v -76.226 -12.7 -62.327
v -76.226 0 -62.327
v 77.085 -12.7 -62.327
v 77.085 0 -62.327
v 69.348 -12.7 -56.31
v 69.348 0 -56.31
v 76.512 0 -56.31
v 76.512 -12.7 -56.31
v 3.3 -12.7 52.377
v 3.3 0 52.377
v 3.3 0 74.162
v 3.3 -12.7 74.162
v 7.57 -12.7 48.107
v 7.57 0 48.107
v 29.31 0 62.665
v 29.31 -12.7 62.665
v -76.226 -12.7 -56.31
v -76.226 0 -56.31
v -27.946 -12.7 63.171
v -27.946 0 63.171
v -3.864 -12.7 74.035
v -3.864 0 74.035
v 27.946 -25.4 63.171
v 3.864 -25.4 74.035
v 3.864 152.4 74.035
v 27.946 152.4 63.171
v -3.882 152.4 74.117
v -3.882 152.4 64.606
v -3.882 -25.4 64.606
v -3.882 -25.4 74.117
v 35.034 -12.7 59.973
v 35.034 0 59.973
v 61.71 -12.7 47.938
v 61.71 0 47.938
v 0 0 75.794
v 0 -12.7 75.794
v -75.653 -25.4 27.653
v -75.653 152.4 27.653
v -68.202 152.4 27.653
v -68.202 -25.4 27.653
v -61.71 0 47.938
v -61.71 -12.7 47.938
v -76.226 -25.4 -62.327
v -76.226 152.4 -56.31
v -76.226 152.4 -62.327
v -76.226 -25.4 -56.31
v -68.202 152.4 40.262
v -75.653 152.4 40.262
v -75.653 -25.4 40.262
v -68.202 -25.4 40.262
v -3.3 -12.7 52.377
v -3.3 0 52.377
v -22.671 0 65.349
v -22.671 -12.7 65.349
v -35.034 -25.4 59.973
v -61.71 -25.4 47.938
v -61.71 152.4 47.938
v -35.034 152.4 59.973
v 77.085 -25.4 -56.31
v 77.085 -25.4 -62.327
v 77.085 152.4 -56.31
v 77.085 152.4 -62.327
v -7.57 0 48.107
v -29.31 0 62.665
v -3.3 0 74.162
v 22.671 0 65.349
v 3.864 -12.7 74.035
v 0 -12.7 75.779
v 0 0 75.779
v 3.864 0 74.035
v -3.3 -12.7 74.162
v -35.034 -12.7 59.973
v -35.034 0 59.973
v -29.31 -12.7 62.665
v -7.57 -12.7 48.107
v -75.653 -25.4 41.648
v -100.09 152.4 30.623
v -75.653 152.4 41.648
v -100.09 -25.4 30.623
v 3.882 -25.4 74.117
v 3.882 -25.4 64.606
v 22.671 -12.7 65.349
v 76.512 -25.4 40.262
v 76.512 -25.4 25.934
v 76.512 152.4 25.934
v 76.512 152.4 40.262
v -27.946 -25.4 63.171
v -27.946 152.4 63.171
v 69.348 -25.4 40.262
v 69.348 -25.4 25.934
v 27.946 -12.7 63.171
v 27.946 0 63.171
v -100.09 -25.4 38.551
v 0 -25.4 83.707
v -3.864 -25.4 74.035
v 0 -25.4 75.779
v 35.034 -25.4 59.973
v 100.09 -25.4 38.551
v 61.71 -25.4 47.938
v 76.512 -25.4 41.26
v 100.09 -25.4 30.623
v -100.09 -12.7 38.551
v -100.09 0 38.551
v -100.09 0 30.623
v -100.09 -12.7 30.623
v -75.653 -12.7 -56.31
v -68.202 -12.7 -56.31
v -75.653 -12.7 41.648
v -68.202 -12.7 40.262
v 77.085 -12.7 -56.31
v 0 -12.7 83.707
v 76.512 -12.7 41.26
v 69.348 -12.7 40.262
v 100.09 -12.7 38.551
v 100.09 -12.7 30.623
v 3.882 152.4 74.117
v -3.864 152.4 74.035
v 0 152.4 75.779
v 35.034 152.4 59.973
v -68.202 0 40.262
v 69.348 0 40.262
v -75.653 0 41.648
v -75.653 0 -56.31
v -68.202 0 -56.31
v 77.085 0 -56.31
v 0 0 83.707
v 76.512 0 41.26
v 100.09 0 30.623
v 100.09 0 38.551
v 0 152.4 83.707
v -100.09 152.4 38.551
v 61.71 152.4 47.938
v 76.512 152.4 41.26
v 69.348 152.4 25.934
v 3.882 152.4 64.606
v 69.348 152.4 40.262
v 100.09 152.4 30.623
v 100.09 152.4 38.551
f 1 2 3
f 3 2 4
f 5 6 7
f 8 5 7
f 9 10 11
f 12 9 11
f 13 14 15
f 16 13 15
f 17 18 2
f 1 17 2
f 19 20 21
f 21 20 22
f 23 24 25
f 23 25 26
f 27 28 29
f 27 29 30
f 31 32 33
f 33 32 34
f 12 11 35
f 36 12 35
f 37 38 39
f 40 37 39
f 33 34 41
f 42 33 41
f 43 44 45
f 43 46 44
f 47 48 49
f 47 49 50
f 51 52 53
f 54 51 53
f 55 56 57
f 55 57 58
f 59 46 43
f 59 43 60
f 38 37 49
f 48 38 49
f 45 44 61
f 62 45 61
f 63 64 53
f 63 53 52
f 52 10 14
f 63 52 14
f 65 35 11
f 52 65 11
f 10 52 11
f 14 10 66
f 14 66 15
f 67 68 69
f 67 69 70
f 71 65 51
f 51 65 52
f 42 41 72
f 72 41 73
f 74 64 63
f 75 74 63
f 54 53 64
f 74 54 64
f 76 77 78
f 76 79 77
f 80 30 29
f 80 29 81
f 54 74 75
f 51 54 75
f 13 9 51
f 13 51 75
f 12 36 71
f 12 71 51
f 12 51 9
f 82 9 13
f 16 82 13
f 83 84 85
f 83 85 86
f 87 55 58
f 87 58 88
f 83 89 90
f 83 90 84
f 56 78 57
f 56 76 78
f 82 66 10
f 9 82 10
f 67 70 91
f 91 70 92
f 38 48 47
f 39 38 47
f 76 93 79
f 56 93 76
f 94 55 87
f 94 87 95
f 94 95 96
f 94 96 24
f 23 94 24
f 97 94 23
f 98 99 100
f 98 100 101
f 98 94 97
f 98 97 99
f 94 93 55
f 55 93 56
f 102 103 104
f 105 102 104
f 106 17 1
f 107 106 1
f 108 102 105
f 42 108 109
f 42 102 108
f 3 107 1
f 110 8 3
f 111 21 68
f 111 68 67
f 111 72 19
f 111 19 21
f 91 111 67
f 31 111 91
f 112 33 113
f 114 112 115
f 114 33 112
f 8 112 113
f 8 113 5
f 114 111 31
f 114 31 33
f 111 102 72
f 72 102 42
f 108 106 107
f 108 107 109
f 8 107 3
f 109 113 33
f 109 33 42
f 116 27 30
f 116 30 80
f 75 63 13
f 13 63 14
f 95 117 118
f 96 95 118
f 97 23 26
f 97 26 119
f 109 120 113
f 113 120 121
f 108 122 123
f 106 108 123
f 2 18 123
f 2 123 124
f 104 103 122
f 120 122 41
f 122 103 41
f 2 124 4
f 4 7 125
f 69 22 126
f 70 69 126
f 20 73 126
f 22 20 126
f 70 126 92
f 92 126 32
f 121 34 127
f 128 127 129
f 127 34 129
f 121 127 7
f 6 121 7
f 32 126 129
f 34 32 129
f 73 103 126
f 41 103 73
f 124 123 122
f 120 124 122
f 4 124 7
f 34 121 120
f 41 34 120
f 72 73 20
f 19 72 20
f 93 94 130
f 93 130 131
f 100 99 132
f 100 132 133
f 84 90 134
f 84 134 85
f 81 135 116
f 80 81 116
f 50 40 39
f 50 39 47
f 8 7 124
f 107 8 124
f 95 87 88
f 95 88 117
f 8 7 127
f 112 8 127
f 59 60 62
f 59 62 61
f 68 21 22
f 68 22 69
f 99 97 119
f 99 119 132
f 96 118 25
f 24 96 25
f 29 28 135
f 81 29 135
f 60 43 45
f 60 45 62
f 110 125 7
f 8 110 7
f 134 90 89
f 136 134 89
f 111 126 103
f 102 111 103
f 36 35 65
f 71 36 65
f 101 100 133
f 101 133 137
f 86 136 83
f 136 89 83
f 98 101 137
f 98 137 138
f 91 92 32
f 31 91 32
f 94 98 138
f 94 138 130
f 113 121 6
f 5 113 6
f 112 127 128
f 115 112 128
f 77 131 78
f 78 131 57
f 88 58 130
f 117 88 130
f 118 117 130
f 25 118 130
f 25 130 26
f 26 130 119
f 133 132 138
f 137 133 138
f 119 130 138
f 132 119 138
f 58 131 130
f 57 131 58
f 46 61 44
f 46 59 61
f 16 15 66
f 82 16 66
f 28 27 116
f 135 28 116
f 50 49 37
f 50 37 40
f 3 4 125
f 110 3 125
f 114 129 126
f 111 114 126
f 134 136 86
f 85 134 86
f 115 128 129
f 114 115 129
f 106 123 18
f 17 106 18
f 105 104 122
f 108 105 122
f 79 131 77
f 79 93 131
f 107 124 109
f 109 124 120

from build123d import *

# Parameters (mm, degrees)
F2_DEPTH      = 25.4
F2_DEPTH_BACK = 152.4
F0_W          = 7.4506402016
F0_H          = 12.6087740064
F0_W_2        = 7.1640759706
F0_H_2        = 14.3281519413
F1_W          = 7.7642686665
F1_H          = 9.5112249255
F0_H_3        = 83.9629881084
F3_DEPTH      = 12.7
F6_DEPTH      = 12.7
F4_W          = 5.8232028969
F4_H          = 12.3464902455
F10_DEPTH     = 12.7


# Not quite as in the source:
# - ends of sketch curves that miss each other by under 0.0002 mm in the source are joined


with BuildPart() as f2:
    # F0 (on Front) → F2 (new body, two sides)
    with BuildSketch(Plane.XZ) as f2_sk:
        Polygon((-75.6526514888, 47.9380041004), (-75.6526514888, 41.6479729853), (-61.7104200599, 47.9380041004), align=None)
        Polygon((61.7104200599, 47.9380041004), (76.5123516321, 41.2601196722), (76.5123516321, 47.9380041004), align=None)
        Polygon((-100.0904308233, 30.6228803963), (-75.6526514888, 41.6479729853), (-75.6526514888, 47.9380041004), (-61.7104200599, 47.9380041004), (-35.0340465252, 59.973037404), (-27.9464338127, 63.1706105272), (-3.864014828, 74.0353824624), (0, 75.7786309245), (0, 83.7069652426), (-100.0904308233, 38.5512147144), align=None)
        Polygon((76.5123516321, 47.9380041004), (76.5123516321, 41.2601196722), (100.0904308233, 30.6228803963), (100.0904308233, 38.5512147144), (0, 83.7069652426), (0, 75.7786309245), (3.864014828, 74.0353824624), (27.9464338127, 63.1706105272), (35.0340465252, 59.973037404), (61.7104200599, 47.9380041004), align=None)
    extrude(amount=F2_DEPTH)
    extrude(f2_sk.sketch, amount=-F2_DEPTH_BACK)


with BuildPart() as f2b:
    # F0 (on Front) → F2, piece 2 (new body, two sides)
    with BuildSketch(Plane.XZ) as f2_2_sk:
        Polygon((-75.6526514888, -56.3096441329), (-76.2257799506, -56.3096441329), (-76.2257799506, -62.3274669051), (77.085480094, -62.3274669051), (77.085480094, -56.3096441329), (76.5123516321, -56.3096441329), (69.3482756615, -56.3096441329), (-68.2020112872, -56.3096441329), align=None)
    extrude(amount=F2_DEPTH)
    extrude(f2_2_sk.sketch, amount=-F2_DEPTH_BACK)


with BuildPart() as f2c:
    # F0 (on Front) → F2, piece 3 (new body, two sides)
    with BuildSketch(Plane.XZ) as f2_3_sk:
        with Locations((-71.927331388, 33.9577309787)):
            Rectangle(F0_W, F0_H)
    extrude(amount=F2_DEPTH)
    extrude(f2_3_sk.sketch, amount=-F2_DEPTH_BACK)


with BuildPart() as f2d:
    # F0 (on Front) → F2, piece 4 (new body, two sides)
    with BuildSketch(Plane.XZ) as f2_4_sk:
        with Locations((72.9303136468, 33.0980420113)):
            Rectangle(F0_W_2, F0_H_2)
    extrude(amount=F2_DEPTH)
    extrude(f2_4_sk.sketch, amount=-F2_DEPTH_BACK)


with BuildPart() as f2e:
    # F1 (on Front) → F2, piece 5 (new body, two sides)
    with BuildSketch(Plane.XZ) as f2_5_sk:
        with Locations((2.328e-07, 69.3615563214)):
            Rectangle(F1_W, F1_H)
    extrude(amount=F2_DEPTH)
    extrude(f2_5_sk.sketch, amount=-F2_DEPTH_BACK)


with BuildPart() as f3:
    # F0 (on Front) → F3 (new body)
    with BuildSketch(Plane.XZ):
        Polygon((-75.6526514888, -56.3096441329), (-76.2257799506, -56.3096441329), (-76.2257799506, -62.3274669051), (77.085480094, -62.3274669051), (77.085480094, -56.3096441329), (76.5123516321, -56.3096441329), (69.3482756615, -56.3096441329), (-68.2020112872, -56.3096441329), align=None)
        with Locations((-71.927331388, -14.3281500787)):
            Rectangle(F0_W, F0_H_3)
        with Locations((-71.927331388, 33.9577309787)):
            Rectangle(F0_W, F0_H)
        Polygon((69.3482756615, 25.9339660406), (69.3482756615, -56.3096422702), (76.5123516321, -56.3096441329), (76.5123516321, 25.9339660406), align=None)
        Polygon((-75.6526514888, 41.6479729853), (-75.6526514888, 40.2621179819), (-68.2020112872, 40.2621179819), (69.3482756615, 40.2621179819), (76.5123516321, 40.2621179819), (76.5123516321, 41.2601196722), (61.7104200599, 47.9380041004), (10.3307002624, 47.9380041004), (3.864014828, 47.9380041004), (-3.864014828, 47.9380041004), (-10.3307002624, 47.9380041004), (-61.7104200599, 47.9380041004), align=None)
        with Locations((72.9303136468, 33.0980420113)):
            Rectangle(F0_W_2, F0_H_2)
        Polygon((-100.0904308233, 30.6228803963), (-75.6526514888, 41.6479729853), (-75.6526514888, 47.9380041004), (-61.7104200599, 47.9380041004), (-35.0340465252, 59.973037404), (-27.9464338127, 63.1706105272), (-3.864014828, 74.0353824624), (0, 75.7786309245), (0, 83.7069652426), (-100.0904308233, 38.5512147144), align=None)
        Polygon((-75.6526514888, 47.9380041004), (-75.6526514888, 41.6479729853), (-61.7104200599, 47.9380041004), align=None)
        Polygon((61.7104200599, 47.9380041004), (76.5123516321, 41.2601196722), (76.5123516321, 47.9380041004), align=None)
        Polygon((76.5123516321, 47.9380041004), (76.5123516321, 41.2601196722), (100.0904308233, 30.6228803963), (100.0904308233, 38.5512147144), (0, 83.7069652426), (0, 75.7786309245), (3.864014828, 74.0353824624), (27.9464338127, 63.1706105272), (35.0340465252, 59.973037404), (61.7104200599, 47.9380041004), align=None)
    extrude(amount=F3_DEPTH)


with BuildPart() as f6:
    # F5 (on face) → F6 (new body)
    with BuildSketch(Plane.XZ):
        Polygon((3.6880273838, 55.2862646402), (2.8213392943, 54.8919215798), (2.8213392943, 48.1377206743), (3.6880273838, 48.5300727755), (3.6880273838, 54.9006089568), align=None)
        Polygon((2.8213392943, 61.1069290045), (2.8213392943, 54.8919215798), (3.6880273838, 55.2862646402), (3.6880273838, 61.1069290045), align=None)
        Polygon((2.8213392943, 48.1377206743), (2.8213392943, 54.8919215798), (2.8213392943, 61.1069290045), (-2.8213392943, 61.1069290045), (-3.6880273838, 61.1069290045), (-3.6880273838, 54.9006089568), (-3.6880273838, 48.1377206743), align=None)
        Polygon((24.6090814471, 64.8053437471), (3.6880273838, 55.2862646402), (3.6880273838, 54.9006089568), (3.6880273838, 48.5300727755), (31.4697353526, 61.1069290045), align=None)
        Polygon((-2.8213392943, 61.1069290045), (2.8213392943, 61.1069290045), (2.8213392943, 73.9230662584), (0, 74.0071956538), (-3.6880273838, 74.1171687841), (-3.6880273838, 61.1069290045), align=None)
        Polygon((2.8213392943, 73.9230662584), (2.8213392943, 61.1069290045), (3.6880273838, 61.1069290045), (3.6880273838, 74.1171687841), (0, 74.0071956538), align=None)
        Polygon((-3.6880273838, 48.1068715453), (-3.6880273838, 48.1377206743), (-3.6880273838, 54.9006089568), (-24.8206017808, 64.4673839815), (-32.4158221483, 61.11202389), align=None)
    extrude(amount=F6_DEPTH)


with BuildPart() as f6b:
    # F4 (on Front) → F6, piece 2 (new body)
    with BuildSketch(Plane.XZ):
        with Locations((0, 67.707815617)):
            Rectangle(F4_W, F4_H)
    extrude(amount=F6_DEPTH)


with BuildPart() as f10:
    # F9 (on Front) → F10 (new body)
    with BuildSketch(Plane.XZ):
        Polygon((-7.5701624155, 48.1068715453), (-3.2998144161, 48.1068715453), (-3.2998144161, 52.3772165179), (-22.6707686226, 65.3488352822), (-29.3101165444, 62.664873898), align=None)
        Polygon((-3.2998144161, 52.3772165179), (-3.2998144161, 48.1068715453), (3.2998144161, 48.1068715453), (3.2998144161, 52.3772165179), (3.2998144161, 65.5764713883), (-3.2998144161, 65.5764713883), align=None)
        Polygon((3.2998144161, 52.3772165179), (3.2998144161, 48.1068715453), (7.5701624155, 48.1068715453), (29.3101165444, 62.664873898), (22.6707686226, 65.3488352822), align=None)
        Polygon((-3.2998144161, 74.1617158055), (-3.2998144161, 65.5764713883), (3.2998144161, 65.5764713883), (3.2998144161, 74.1617158055), (0, 75.7939517498), align=None)
    extrude(amount=F10_DEPTH)


solid = Compound([f2.part, f2b.part, f2c.part, f2d.part, f2e.part, f3.part, f10.part])
